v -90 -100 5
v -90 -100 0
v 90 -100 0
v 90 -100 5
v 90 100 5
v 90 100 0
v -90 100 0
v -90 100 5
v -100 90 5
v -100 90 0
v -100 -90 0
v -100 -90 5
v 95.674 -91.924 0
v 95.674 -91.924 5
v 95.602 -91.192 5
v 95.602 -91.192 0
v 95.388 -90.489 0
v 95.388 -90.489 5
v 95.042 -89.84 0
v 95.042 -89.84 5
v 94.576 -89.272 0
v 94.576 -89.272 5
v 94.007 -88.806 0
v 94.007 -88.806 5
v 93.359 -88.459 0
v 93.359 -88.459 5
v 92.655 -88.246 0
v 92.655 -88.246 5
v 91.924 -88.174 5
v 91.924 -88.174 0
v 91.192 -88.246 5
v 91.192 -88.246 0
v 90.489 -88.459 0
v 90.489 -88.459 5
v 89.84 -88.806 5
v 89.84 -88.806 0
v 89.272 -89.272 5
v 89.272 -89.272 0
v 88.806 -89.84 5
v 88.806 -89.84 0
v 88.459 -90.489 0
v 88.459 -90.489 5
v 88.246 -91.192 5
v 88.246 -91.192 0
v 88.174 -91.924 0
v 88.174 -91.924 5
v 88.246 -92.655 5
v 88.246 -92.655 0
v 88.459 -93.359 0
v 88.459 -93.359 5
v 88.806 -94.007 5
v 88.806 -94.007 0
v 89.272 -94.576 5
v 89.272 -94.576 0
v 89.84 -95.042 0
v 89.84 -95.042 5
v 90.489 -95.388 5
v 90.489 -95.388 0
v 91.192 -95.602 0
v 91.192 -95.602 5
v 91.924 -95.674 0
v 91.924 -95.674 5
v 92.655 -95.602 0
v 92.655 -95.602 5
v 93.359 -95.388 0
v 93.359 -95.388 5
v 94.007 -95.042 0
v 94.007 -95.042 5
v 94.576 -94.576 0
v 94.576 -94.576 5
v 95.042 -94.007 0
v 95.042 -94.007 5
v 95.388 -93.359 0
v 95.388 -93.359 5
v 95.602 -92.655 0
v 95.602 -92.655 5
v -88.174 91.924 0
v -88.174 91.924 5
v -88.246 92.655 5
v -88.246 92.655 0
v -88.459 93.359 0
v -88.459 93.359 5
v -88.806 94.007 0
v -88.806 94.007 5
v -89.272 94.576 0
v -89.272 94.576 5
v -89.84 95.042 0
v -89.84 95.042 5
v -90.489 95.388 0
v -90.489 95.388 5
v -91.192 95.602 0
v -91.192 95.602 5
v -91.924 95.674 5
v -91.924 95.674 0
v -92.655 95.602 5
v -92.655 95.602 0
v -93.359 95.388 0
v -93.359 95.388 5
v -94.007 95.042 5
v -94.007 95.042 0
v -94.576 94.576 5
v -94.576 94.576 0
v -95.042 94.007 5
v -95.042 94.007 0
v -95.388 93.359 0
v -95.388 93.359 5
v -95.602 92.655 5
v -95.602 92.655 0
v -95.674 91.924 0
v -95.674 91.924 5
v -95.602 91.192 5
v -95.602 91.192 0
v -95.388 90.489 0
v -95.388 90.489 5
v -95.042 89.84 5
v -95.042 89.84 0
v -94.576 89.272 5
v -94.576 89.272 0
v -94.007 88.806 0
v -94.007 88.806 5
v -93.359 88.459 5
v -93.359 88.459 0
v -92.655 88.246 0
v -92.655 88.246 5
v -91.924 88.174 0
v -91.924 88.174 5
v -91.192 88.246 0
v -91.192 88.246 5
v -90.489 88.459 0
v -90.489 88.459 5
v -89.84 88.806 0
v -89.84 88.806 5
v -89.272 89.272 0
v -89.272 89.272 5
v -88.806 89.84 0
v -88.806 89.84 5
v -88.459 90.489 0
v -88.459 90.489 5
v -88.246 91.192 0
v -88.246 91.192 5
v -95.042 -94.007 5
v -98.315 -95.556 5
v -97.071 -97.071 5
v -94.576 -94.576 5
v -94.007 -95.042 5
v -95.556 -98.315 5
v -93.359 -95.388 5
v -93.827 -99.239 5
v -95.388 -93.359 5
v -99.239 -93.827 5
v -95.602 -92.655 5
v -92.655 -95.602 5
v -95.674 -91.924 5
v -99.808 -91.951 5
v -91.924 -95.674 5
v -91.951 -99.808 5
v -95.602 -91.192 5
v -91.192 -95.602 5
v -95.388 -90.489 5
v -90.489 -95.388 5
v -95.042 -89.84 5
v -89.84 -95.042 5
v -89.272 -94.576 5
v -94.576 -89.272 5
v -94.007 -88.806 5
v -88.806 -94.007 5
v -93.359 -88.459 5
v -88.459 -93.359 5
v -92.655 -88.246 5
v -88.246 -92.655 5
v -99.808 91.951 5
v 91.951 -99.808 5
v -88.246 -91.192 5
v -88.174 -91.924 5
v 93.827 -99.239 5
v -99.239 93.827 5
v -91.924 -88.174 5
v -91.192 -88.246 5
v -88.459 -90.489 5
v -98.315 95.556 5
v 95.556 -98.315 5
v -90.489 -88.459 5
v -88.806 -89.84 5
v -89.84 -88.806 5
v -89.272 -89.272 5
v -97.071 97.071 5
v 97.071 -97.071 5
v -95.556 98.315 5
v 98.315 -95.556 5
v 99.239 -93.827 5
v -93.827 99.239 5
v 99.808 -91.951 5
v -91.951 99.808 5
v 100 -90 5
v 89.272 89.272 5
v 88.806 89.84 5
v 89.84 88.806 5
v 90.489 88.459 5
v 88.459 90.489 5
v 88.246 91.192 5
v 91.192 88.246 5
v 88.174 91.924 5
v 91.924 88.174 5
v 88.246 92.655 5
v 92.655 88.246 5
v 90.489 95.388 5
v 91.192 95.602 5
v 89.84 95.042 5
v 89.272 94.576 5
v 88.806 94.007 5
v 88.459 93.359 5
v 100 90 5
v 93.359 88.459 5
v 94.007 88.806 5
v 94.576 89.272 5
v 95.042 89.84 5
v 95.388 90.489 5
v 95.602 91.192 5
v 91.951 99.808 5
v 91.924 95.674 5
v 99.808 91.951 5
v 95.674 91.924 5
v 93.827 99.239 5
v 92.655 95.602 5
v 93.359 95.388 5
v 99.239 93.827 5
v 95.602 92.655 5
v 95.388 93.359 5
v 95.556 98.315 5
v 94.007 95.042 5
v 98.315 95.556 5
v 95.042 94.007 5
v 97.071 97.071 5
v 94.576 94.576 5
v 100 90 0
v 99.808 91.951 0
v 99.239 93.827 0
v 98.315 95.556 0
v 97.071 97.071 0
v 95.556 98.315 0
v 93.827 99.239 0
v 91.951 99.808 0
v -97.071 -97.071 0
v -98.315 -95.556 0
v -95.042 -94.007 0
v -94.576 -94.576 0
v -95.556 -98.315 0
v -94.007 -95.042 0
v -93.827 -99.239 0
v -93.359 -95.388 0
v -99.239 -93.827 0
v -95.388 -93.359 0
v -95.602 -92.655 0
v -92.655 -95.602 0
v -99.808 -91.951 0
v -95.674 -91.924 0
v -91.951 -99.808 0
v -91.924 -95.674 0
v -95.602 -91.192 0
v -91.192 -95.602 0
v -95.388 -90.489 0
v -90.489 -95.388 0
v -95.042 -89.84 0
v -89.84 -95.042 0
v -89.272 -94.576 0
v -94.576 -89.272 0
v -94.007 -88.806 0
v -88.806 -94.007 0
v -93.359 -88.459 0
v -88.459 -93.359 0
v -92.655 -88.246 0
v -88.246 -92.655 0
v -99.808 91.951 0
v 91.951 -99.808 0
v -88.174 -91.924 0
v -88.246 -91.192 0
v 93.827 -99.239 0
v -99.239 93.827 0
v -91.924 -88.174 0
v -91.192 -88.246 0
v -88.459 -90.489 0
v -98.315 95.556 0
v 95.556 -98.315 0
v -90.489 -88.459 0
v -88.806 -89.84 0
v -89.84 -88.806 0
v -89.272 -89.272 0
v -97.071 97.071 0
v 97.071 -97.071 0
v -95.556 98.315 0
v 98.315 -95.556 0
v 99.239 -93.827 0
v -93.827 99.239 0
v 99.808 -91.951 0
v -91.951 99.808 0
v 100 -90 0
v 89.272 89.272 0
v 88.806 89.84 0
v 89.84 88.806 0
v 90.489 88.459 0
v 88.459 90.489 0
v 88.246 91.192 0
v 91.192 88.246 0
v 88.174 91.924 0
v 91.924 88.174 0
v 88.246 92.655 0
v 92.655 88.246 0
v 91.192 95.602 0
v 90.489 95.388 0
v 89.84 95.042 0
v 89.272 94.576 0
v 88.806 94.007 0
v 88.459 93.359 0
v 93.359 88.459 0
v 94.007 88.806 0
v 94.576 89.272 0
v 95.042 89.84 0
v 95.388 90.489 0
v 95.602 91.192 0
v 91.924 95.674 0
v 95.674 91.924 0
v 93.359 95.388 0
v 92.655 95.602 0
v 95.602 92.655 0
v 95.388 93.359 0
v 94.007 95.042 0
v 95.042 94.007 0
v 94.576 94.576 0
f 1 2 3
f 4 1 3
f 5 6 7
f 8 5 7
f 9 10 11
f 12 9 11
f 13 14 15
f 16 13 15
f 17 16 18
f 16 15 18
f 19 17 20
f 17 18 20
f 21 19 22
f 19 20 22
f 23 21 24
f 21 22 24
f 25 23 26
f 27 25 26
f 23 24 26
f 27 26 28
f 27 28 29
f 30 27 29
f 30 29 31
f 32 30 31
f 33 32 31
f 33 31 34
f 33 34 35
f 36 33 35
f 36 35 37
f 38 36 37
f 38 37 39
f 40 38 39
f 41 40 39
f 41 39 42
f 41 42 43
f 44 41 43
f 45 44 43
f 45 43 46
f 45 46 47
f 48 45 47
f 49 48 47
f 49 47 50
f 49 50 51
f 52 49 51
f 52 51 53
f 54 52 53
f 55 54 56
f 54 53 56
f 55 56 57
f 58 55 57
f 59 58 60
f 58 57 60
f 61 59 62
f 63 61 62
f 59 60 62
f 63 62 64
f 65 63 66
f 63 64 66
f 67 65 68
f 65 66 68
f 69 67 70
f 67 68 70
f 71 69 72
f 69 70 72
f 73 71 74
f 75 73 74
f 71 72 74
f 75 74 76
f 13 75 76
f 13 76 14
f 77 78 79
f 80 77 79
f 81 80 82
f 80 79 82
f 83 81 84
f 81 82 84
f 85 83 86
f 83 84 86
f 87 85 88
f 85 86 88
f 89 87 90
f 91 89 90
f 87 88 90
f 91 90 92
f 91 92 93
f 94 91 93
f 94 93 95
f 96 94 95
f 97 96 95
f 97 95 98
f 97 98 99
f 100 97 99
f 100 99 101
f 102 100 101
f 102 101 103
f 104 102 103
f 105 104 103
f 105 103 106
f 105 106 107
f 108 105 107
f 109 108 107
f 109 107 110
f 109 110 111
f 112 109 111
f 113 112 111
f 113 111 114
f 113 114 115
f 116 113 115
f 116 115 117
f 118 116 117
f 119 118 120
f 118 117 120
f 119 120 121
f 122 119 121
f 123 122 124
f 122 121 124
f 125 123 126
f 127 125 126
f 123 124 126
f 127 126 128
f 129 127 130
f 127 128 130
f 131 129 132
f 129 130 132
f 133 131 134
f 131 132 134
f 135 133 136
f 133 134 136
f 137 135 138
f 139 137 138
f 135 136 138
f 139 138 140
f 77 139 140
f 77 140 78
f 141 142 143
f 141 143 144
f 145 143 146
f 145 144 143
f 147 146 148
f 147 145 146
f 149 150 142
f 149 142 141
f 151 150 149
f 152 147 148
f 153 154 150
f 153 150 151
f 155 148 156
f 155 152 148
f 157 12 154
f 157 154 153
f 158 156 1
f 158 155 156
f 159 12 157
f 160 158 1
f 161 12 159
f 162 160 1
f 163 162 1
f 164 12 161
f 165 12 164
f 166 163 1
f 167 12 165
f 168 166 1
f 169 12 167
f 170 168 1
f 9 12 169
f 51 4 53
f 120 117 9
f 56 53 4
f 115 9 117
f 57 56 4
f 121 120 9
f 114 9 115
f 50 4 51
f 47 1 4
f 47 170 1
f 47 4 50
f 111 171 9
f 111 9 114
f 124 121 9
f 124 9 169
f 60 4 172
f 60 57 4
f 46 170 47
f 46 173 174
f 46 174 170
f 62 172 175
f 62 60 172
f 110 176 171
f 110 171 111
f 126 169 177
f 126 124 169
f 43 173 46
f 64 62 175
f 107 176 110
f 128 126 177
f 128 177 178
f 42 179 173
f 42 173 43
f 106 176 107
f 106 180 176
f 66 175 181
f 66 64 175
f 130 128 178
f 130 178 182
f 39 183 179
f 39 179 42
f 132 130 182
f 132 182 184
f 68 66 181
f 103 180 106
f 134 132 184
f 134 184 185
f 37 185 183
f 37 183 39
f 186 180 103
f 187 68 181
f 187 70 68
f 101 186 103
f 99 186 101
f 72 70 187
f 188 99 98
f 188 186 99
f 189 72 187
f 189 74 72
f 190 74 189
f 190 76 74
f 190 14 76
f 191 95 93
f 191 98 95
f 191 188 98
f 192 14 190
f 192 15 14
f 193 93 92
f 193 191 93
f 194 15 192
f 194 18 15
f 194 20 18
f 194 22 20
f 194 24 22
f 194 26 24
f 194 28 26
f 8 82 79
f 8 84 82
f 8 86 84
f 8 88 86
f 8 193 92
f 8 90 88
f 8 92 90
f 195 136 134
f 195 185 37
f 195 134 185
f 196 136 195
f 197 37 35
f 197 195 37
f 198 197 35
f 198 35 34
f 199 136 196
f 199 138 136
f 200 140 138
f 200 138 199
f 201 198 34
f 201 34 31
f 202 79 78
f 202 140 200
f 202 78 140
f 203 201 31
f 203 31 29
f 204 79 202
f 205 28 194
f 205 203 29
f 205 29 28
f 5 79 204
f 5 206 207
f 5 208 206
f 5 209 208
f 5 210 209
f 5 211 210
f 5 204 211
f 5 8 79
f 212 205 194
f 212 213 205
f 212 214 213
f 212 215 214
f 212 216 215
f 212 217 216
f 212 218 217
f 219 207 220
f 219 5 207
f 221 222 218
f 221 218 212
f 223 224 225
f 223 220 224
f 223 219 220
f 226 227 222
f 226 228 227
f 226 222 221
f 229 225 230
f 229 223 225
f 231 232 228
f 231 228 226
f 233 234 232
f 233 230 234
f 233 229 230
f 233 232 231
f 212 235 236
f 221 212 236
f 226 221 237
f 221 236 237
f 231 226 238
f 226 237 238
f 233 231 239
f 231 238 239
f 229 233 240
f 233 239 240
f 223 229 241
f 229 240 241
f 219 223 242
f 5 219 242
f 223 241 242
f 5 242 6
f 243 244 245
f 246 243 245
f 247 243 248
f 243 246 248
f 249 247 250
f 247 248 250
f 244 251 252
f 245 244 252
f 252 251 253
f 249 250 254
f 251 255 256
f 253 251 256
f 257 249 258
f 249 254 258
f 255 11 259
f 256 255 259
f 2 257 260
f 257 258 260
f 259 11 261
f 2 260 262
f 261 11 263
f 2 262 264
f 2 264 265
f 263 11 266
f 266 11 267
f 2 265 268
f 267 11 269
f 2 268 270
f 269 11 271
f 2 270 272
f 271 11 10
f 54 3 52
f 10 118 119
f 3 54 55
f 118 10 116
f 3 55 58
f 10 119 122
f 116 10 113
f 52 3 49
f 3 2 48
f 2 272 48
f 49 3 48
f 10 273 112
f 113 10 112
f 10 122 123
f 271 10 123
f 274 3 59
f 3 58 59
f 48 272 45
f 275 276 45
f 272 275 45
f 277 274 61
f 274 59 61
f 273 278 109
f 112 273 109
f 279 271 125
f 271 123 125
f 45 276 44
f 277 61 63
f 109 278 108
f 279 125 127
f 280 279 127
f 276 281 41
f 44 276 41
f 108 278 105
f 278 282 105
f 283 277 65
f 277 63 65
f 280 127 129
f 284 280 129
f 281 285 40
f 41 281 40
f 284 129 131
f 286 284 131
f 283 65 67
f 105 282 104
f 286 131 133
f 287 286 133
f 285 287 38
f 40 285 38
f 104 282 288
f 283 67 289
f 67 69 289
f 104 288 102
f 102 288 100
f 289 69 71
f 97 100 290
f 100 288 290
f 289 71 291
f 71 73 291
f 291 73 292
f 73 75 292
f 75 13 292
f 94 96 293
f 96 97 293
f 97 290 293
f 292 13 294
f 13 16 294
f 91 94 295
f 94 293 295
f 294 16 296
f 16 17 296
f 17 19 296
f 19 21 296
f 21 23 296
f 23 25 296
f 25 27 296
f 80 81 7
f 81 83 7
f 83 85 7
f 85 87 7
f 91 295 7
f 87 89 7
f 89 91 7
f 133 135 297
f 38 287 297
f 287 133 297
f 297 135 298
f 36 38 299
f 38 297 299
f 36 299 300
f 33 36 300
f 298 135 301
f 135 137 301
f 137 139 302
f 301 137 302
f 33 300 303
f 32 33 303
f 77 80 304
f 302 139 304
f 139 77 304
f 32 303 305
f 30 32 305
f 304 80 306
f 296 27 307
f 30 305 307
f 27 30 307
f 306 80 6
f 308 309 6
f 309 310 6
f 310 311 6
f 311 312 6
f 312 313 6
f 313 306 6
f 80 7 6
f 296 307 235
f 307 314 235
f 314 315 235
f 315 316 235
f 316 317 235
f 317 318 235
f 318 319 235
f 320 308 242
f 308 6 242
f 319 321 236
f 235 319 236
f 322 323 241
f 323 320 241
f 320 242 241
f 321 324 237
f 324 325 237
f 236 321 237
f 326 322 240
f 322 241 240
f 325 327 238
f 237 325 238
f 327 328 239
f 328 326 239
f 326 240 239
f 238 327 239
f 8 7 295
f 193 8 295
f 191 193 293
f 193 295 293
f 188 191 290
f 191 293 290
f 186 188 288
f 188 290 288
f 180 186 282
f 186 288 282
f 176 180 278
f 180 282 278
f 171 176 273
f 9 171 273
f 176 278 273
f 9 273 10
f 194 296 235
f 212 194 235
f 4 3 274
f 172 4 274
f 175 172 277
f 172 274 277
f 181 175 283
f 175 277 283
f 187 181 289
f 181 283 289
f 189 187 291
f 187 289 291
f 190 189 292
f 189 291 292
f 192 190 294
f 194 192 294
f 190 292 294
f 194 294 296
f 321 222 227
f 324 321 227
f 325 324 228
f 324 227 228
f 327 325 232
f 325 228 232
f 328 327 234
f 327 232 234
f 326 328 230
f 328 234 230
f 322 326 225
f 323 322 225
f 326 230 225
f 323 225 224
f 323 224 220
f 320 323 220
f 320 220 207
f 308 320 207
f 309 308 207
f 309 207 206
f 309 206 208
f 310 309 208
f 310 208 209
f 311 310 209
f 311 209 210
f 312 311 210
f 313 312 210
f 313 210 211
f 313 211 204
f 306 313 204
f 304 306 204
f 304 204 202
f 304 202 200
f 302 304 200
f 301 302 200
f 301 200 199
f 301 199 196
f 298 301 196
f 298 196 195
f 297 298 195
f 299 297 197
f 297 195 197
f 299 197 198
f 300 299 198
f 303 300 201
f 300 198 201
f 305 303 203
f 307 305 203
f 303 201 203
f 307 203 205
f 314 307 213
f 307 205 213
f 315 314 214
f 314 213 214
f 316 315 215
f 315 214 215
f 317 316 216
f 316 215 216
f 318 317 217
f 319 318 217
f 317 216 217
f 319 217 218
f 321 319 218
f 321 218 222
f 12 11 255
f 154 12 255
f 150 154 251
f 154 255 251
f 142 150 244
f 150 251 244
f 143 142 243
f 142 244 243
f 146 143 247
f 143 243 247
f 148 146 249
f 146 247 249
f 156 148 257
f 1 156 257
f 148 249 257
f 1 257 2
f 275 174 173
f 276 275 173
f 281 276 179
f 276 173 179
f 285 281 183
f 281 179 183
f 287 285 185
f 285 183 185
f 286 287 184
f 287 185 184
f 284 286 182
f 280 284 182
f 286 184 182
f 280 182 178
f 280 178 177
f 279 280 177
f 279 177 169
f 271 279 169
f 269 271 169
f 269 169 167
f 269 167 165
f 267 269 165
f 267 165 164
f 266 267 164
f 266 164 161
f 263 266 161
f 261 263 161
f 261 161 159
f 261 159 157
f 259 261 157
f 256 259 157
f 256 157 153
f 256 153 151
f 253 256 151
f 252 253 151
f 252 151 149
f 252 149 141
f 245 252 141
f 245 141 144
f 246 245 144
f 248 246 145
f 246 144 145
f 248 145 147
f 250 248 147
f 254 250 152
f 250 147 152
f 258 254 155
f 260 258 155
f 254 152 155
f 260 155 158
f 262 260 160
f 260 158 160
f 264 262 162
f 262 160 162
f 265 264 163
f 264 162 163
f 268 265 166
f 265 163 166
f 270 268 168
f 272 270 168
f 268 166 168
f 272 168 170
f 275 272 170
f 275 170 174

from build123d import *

# Parameters (mm, degrees)
SKETCH1_R           = 2
BOSS_EXTRUDE1_DEPTH = 5
CUT_EXTRUDE1_REACH  = 143.51
SKETCH2_R           = 3.75


with BuildPart() as part:
    # Sketch1 → Boss-Extrude1 (new body)
    with BuildSketch(Plane.XY):
        with BuildLine():
            Line((-90, -100), (90, -100))
            ThreePointArc((90, -100), (97.071067812, -97.071067812), (100, -90))
            Line((100, -90), (100, 90))
            ThreePointArc((100, 90), (97.071067812, 97.071067812), (90, 100))
            Line((90, 100), (-90, 100))
            ThreePointArc((-90, 100), (-97.071067812, 97.071067812), (-100, 90))
            Line((-100, 90), (-100, -90))
            ThreePointArc((-100, -90), (-97.071067812, -97.071067812), (-90, -100))
        make_face()
        with Locations((-91.923881554, 91.923881554)):
            Circle(SKETCH1_R, mode=Mode.SUBTRACT)
        with Locations((91.923881554, 91.923881554)):
            Circle(SKETCH1_R, mode=Mode.SUBTRACT)
        with Locations((-91.923881554, -91.923881554)):
            Circle(SKETCH1_R, mode=Mode.SUBTRACT)
        with Locations((91.923881554, -91.923881554)):
            Circle(SKETCH1_R, mode=Mode.SUBTRACT)
    extrude(amount=BOSS_EXTRUDE1_DEPTH)

    # Sketch2 → Cut-Extrude1 (cut, up to next)
    with BuildSketch(Plane.XY.offset(5), mode=Mode.PRIVATE) as cut_extrude1_sk1:
        with Locations((91.923881554, 91.923881554)):
            Circle(SKETCH2_R)
    cut_extrude1_tool1 = extrude(cut_extrude1_sk1.sketch, amount=-CUT_EXTRUDE1_REACH, mode=Mode.PRIVATE) & part.part
    # Sketch2 → Cut-Extrude1 (cut, up to next)
    with BuildSketch(Plane.XY.offset(5), mode=Mode.PRIVATE) as cut_extrude1_sk2:
        with Locations((-91.923881554, 91.923881554)):
            Circle(SKETCH2_R)
    cut_extrude1_tool2 = extrude(cut_extrude1_sk2.sketch, amount=-CUT_EXTRUDE1_REACH, mode=Mode.PRIVATE) & part.part
    # Sketch2 → Cut-Extrude1 (cut, up to next)
    with BuildSketch(Plane.XY.offset(5), mode=Mode.PRIVATE) as cut_extrude1_sk3:
        with Locations((-91.923881554, -91.923881554)):
            Circle(SKETCH2_R)
    cut_extrude1_tool3 = extrude(cut_extrude1_sk3.sketch, amount=-CUT_EXTRUDE1_REACH, mode=Mode.PRIVATE) & part.part
    # Sketch2 → Cut-Extrude1 (cut, up to next)
    with BuildSketch(Plane.XY.offset(5), mode=Mode.PRIVATE) as cut_extrude1_sk4:
        with Locations((91.923881554, -91.923881554)):
            Circle(SKETCH2_R)
    cut_extrude1_tool4 = extrude(cut_extrude1_sk4.sketch, amount=-CUT_EXTRUDE1_REACH, mode=Mode.PRIVATE) & part.part
    add(cut_extrude1_tool1.solids().sort_by_distance((91.923882, 91.923882, 5))[0], mode=Mode.SUBTRACT)
    add(cut_extrude1_tool2.solids().sort_by_distance((-91.923882, 91.923882, 5))[0], mode=Mode.SUBTRACT)
    add(cut_extrude1_tool3.solids().sort_by_distance((-91.923882, -91.923882, 5))[0], mode=Mode.SUBTRACT)
    add(cut_extrude1_tool4.solids().sort_by_distance((91.923882, -91.923882, 5))[0], mode=Mode.SUBTRACT)


solid = part.part
